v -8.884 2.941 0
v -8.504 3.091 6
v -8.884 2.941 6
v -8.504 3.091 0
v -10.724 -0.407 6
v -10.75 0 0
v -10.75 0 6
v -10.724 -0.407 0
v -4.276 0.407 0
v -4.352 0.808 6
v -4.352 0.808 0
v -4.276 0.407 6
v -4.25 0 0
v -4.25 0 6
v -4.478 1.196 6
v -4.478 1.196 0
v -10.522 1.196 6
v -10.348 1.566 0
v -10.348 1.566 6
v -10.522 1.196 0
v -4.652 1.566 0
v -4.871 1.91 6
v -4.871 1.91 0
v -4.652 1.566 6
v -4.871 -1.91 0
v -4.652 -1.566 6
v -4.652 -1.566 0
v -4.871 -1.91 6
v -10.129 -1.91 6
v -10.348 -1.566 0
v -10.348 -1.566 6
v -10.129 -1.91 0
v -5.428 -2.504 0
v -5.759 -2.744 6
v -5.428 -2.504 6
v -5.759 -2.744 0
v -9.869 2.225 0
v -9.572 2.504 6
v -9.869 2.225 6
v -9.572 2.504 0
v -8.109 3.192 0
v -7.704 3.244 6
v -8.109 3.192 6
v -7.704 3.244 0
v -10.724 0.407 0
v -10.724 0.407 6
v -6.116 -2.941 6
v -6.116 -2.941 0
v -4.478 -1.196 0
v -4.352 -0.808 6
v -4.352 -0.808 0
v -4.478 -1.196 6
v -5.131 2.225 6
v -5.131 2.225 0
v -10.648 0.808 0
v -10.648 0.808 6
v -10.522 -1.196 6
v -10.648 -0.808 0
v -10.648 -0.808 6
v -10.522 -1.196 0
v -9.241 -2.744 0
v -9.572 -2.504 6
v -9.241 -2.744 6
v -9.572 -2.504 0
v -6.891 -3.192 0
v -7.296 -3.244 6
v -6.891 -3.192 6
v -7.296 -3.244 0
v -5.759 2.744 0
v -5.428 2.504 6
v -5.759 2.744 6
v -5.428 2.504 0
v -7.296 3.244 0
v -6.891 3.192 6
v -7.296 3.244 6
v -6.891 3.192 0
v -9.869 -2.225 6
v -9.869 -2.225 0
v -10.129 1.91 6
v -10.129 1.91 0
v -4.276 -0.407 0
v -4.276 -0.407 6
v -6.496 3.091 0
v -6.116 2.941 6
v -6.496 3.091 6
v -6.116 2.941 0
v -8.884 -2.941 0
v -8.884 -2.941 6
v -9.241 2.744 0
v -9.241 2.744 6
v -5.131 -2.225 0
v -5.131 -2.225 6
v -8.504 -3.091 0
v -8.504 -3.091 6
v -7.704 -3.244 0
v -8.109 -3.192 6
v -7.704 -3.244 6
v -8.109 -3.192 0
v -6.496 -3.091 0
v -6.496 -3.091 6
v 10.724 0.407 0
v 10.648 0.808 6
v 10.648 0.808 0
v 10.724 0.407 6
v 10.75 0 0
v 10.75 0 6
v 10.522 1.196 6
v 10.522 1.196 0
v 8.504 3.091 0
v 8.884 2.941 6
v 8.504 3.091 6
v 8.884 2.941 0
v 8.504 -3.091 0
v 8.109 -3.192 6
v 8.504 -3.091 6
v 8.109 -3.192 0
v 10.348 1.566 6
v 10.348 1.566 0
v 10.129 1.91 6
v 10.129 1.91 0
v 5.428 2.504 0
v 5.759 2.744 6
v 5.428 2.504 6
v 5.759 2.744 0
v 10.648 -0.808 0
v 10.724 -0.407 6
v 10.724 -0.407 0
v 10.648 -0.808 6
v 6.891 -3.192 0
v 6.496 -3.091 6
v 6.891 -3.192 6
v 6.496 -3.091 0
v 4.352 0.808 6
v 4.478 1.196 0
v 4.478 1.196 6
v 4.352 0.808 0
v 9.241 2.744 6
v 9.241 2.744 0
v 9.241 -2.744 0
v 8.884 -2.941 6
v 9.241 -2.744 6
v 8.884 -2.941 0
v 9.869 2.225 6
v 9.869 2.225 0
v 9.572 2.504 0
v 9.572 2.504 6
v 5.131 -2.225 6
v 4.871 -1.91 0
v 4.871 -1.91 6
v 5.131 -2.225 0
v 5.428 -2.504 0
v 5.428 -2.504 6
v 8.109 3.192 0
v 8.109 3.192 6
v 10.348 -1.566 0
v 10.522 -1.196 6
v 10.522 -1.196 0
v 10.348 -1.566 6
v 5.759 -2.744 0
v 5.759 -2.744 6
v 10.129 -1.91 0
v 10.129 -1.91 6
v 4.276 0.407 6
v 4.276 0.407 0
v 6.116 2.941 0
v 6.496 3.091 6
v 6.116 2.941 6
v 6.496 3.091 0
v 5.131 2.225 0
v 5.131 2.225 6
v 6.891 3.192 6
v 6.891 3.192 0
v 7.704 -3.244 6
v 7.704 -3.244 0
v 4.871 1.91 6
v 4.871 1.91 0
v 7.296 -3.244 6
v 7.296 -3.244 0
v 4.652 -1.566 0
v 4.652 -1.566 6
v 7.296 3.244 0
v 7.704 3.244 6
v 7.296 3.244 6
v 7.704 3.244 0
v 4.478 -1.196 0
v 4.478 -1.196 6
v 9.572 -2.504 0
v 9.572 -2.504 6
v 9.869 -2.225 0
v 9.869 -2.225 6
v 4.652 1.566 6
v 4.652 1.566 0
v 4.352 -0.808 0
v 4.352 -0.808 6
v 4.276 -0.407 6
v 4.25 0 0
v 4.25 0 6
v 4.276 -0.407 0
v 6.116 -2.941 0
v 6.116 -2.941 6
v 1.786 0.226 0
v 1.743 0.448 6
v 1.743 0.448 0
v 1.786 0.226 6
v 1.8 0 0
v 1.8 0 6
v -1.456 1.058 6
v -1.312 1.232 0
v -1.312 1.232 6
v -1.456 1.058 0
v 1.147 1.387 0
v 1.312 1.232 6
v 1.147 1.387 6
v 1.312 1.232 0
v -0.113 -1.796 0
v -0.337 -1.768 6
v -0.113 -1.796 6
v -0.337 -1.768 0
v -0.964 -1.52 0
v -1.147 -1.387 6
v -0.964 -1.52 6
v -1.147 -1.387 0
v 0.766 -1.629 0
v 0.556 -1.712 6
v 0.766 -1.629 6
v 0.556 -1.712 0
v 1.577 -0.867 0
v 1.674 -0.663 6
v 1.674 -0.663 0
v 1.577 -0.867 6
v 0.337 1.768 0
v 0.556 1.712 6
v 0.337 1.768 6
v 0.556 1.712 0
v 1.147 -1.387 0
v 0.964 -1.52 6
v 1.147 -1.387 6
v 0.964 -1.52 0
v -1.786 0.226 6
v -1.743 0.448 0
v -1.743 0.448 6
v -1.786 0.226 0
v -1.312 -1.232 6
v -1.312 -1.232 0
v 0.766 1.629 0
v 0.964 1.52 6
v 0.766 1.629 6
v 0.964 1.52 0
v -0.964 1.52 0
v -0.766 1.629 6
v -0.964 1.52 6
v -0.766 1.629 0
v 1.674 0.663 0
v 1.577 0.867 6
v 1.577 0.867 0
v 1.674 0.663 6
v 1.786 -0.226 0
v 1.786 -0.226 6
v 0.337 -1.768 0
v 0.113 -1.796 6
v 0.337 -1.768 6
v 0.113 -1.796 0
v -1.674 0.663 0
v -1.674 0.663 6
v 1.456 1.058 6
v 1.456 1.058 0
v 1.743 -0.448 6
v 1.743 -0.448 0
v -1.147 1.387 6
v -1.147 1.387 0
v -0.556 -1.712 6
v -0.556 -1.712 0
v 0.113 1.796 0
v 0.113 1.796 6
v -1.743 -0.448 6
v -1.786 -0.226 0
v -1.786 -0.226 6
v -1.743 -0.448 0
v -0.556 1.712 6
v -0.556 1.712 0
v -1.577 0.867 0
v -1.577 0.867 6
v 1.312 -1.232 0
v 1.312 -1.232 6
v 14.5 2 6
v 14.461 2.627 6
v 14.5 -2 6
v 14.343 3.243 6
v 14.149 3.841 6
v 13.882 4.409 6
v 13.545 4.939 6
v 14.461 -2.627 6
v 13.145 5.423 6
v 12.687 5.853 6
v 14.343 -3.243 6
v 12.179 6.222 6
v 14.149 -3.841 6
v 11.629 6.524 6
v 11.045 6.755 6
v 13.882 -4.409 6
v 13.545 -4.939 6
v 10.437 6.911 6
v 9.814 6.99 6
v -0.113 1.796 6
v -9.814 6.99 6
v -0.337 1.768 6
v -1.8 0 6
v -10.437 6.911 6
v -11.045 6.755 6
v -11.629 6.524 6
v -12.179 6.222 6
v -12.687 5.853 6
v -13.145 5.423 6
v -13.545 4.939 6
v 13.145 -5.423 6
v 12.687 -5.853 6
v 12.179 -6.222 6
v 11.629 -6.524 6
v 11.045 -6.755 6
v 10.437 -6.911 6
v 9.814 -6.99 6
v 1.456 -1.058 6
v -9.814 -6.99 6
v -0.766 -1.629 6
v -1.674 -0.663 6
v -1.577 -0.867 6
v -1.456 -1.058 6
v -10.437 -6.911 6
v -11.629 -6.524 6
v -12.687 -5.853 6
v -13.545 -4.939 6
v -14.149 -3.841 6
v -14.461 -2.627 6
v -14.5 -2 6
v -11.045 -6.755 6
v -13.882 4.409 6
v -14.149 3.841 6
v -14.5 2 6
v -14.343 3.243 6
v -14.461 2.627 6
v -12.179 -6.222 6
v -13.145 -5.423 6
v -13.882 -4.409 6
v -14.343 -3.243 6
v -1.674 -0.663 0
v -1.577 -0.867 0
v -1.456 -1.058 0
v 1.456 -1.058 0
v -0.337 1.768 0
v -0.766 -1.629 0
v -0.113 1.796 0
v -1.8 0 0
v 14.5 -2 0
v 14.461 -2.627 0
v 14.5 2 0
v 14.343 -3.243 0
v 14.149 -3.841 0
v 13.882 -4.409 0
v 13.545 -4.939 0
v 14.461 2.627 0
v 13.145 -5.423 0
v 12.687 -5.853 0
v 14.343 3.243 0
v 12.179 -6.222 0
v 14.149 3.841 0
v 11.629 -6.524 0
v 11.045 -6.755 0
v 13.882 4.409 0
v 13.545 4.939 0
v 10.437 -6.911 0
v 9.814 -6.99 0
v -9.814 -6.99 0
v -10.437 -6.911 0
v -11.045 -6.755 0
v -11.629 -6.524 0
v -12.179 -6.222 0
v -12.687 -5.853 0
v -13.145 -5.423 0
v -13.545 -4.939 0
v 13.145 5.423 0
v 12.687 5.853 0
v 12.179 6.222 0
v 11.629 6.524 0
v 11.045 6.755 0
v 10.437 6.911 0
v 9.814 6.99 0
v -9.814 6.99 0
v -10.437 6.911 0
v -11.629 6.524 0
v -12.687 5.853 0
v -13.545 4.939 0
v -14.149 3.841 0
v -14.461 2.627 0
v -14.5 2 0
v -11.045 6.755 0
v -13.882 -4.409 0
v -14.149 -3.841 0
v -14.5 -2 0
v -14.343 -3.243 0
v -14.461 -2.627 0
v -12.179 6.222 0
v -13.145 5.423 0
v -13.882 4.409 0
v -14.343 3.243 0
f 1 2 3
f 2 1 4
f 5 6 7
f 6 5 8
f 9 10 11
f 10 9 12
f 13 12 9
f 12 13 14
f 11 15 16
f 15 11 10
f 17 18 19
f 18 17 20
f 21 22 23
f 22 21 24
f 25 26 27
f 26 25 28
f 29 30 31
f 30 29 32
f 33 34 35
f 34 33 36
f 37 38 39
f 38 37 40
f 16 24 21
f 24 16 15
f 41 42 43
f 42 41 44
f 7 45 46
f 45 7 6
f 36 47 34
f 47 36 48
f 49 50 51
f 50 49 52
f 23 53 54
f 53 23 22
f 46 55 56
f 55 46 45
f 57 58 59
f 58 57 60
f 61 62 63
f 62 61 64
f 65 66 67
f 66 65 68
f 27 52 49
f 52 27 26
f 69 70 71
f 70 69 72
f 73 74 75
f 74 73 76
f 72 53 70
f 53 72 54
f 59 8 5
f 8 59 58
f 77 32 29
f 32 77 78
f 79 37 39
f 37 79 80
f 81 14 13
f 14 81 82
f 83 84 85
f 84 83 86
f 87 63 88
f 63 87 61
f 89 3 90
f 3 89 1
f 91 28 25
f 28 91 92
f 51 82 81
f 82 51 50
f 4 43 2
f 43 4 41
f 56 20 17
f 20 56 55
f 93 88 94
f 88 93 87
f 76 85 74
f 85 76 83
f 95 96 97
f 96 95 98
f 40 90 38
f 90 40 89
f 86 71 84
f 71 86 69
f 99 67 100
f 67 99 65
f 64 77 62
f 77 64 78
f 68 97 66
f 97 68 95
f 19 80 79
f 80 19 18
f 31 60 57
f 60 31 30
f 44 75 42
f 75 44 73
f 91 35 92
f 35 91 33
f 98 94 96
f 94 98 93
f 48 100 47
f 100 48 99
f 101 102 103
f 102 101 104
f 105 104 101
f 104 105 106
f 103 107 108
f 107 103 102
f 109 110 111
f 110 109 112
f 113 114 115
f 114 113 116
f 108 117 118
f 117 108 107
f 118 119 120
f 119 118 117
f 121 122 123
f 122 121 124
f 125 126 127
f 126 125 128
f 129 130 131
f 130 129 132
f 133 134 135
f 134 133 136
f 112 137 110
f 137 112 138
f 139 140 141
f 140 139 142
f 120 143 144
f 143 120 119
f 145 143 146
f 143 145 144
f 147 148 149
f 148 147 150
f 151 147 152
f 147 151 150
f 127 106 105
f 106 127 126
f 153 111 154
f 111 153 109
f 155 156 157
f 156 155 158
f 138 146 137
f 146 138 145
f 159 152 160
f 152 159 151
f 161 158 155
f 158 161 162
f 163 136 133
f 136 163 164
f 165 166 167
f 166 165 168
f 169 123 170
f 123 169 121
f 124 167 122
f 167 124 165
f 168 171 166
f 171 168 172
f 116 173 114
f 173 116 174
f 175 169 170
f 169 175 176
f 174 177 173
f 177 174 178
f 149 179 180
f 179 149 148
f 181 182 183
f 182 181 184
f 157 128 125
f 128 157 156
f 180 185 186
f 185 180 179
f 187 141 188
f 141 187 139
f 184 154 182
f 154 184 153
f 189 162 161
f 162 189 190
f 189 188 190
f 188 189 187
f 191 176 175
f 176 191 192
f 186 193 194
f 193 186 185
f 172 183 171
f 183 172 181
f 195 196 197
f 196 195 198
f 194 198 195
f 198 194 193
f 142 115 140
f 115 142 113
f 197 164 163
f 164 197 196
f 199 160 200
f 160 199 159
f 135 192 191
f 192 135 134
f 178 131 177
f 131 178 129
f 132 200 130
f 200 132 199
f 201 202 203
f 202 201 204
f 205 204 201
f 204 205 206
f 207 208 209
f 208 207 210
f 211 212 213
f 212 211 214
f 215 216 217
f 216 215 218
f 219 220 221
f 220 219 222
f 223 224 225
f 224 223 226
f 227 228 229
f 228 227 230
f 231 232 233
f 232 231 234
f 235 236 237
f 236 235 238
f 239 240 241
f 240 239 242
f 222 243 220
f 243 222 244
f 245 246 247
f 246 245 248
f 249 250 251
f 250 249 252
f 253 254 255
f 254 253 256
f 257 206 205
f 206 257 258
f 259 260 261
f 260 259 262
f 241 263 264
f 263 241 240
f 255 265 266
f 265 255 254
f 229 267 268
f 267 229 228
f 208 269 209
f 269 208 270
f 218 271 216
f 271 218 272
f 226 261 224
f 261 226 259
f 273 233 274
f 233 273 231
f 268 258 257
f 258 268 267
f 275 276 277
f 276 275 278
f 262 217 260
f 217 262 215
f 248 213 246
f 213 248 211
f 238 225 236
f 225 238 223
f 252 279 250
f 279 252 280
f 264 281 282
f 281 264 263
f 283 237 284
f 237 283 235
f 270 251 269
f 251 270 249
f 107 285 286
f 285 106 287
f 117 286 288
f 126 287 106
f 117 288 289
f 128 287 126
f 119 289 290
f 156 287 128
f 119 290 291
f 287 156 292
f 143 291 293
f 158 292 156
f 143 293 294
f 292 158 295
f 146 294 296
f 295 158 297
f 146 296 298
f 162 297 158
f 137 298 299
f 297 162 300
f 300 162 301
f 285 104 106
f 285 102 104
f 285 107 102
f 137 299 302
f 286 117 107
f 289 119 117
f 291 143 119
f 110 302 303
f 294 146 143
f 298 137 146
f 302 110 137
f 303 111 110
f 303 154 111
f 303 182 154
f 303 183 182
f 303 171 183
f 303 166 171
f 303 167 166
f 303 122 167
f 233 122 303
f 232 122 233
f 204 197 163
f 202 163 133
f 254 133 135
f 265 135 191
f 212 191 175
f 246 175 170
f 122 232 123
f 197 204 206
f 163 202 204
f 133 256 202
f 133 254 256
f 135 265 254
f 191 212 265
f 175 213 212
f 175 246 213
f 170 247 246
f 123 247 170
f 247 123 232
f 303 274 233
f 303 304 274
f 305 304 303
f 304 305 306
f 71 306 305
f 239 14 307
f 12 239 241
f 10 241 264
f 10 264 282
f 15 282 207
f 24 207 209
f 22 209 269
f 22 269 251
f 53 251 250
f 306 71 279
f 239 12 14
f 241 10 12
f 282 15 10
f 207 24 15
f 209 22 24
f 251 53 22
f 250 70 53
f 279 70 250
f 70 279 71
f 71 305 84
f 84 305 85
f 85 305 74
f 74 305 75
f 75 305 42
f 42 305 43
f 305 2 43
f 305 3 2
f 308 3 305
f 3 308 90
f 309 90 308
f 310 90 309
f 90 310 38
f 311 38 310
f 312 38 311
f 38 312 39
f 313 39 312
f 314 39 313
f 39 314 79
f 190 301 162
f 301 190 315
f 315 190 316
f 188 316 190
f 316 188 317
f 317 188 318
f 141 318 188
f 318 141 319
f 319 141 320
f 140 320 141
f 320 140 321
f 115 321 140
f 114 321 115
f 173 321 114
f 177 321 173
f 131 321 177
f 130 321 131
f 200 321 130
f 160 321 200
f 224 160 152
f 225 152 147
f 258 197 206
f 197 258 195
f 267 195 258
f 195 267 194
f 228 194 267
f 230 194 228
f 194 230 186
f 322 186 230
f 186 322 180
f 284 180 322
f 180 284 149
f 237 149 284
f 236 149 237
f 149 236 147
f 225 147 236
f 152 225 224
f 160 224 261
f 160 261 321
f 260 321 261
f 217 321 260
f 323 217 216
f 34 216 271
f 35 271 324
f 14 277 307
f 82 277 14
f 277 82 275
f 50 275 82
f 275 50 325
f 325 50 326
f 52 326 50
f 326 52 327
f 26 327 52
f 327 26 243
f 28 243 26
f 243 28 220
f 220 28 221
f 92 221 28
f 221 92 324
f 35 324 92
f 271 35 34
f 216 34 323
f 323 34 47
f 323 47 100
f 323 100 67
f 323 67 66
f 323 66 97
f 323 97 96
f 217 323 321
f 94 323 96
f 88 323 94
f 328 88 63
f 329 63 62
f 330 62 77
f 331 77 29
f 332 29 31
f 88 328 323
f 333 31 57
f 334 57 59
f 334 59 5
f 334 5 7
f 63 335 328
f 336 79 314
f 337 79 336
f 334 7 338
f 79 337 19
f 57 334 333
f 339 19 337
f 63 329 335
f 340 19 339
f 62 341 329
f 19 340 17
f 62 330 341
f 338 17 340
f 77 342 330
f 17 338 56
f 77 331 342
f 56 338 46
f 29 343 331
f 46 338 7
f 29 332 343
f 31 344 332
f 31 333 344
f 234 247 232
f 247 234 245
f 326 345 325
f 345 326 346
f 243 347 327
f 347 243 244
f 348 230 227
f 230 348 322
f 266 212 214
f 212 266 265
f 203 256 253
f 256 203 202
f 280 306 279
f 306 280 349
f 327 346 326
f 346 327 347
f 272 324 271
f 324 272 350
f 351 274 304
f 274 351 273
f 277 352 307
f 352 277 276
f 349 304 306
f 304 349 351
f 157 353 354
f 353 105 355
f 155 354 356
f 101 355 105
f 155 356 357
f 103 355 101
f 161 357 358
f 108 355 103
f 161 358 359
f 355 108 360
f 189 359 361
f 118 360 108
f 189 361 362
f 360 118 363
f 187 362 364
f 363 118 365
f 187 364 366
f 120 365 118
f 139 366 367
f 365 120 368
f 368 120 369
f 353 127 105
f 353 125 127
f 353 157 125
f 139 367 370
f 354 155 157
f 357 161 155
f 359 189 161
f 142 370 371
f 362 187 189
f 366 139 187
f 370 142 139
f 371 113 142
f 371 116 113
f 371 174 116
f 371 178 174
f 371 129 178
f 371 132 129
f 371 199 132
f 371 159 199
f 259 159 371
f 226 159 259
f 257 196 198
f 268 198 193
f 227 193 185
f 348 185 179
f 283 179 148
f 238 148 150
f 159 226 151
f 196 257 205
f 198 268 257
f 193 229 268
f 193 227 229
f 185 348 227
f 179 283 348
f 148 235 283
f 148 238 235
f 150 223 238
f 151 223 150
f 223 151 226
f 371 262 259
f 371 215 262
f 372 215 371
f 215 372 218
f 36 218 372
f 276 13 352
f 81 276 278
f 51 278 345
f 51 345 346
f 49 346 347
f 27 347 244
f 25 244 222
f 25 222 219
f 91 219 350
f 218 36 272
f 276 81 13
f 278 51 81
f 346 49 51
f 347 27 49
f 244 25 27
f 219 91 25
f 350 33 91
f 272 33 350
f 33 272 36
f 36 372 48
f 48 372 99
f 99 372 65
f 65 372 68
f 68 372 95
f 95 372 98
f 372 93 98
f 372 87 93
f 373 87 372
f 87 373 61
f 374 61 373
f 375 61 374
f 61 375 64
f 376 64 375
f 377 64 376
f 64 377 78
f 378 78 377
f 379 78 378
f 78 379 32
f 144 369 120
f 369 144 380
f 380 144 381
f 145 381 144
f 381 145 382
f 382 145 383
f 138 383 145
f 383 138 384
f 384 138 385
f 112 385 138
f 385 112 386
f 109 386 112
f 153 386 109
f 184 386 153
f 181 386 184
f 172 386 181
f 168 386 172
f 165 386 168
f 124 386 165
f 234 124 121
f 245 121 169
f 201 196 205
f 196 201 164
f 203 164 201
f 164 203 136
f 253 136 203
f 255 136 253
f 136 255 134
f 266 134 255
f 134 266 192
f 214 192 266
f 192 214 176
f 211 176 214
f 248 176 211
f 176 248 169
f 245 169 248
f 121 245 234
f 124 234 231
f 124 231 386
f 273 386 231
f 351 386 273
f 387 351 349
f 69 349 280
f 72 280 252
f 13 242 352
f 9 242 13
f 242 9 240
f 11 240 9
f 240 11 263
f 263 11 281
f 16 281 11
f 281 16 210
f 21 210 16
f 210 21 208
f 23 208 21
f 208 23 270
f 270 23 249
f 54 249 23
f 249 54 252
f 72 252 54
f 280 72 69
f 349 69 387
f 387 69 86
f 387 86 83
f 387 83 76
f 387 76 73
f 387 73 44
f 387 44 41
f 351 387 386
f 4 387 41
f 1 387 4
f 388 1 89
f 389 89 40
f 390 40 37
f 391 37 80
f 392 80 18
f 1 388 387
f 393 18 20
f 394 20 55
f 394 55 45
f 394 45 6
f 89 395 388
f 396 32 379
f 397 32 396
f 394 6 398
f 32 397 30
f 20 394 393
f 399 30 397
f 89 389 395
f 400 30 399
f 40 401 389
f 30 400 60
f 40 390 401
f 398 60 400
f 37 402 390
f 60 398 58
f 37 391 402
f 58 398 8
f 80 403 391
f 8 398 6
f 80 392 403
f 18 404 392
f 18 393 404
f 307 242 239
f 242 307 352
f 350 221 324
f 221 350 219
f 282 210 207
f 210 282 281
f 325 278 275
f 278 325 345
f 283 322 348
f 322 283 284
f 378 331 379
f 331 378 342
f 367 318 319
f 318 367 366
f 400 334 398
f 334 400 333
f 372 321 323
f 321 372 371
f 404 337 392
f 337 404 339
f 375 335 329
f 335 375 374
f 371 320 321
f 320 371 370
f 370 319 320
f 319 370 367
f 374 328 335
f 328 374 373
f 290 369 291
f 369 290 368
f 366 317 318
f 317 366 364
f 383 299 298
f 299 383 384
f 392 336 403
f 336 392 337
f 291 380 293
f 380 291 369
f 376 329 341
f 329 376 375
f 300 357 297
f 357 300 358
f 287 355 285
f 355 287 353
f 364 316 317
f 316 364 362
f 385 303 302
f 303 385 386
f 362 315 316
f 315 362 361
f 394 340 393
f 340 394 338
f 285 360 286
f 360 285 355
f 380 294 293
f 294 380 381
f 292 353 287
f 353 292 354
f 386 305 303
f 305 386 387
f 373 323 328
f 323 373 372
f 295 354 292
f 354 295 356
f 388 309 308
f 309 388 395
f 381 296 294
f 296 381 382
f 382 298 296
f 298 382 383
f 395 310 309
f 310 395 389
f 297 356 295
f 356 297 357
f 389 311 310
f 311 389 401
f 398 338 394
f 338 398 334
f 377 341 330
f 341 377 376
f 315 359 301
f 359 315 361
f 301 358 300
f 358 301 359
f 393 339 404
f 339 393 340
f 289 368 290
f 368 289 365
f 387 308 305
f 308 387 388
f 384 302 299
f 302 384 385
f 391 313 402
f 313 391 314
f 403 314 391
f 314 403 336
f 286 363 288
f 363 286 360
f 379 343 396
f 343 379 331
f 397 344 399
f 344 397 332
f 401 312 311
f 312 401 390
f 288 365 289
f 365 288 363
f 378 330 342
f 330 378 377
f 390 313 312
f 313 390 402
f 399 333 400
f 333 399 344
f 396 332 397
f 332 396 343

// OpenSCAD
$fn = 50;


difference() {
	union() {
		hull() {
			translate(v = [-9.5000000000, 2.0000000000, 0]) {
				cylinder(h = 6, r = 5);
			}
			translate(v = [9.5000000000, 2.0000000000, 0]) {
				cylinder(h = 6, r = 5);
			}
			translate(v = [-9.5000000000, -2.0000000000, 0]) {
				cylinder(h = 6, r = 5);
			}
			translate(v = [9.5000000000, -2.0000000000, 0]) {
				cylinder(h = 6, r = 5);
			}
		}
	}
	union() {
		translate(v = [-7.5000000000, 0.0000000000, -100.0000000000]) {
			cylinder(h = 200, r = 3.2500000000);
		}
		translate(v = [7.5000000000, 0.0000000000, -100.0000000000]) {
			cylinder(h = 200, r = 3.2500000000);
		}
		translate(v = [-7.5000000000, 0.0000000000, 0]) {
			cylinder(h = 6, r = 1.8000000000);
		}
		cylinder(h = 6, r = 1.8000000000);
		translate(v = [7.5000000000, 0.0000000000, 0]) {
			cylinder(h = 6, r = 1.8000000000);
		}
		translate(v = [-7.5000000000, 0.0000000000, 0]) {
			cylinder(h = 6, r = 1.8000000000);
		}
		cylinder(h = 6, r = 1.8000000000);
		translate(v = [7.5000000000, 0.0000000000, 0]) {
			cylinder(h = 6, r = 1.8000000000);
		}
		translate(v = [-7.5000000000, 0.0000000000, 0]) {
			cylinder(h = 6, r = 1.8000000000);
		}
		cylinder(h = 6, r = 1.8000000000);
		translate(v = [7.5000000000, 0.0000000000, 0]) {
			cylinder(h = 6, r = 1.8000000000);
		}
	}
}
